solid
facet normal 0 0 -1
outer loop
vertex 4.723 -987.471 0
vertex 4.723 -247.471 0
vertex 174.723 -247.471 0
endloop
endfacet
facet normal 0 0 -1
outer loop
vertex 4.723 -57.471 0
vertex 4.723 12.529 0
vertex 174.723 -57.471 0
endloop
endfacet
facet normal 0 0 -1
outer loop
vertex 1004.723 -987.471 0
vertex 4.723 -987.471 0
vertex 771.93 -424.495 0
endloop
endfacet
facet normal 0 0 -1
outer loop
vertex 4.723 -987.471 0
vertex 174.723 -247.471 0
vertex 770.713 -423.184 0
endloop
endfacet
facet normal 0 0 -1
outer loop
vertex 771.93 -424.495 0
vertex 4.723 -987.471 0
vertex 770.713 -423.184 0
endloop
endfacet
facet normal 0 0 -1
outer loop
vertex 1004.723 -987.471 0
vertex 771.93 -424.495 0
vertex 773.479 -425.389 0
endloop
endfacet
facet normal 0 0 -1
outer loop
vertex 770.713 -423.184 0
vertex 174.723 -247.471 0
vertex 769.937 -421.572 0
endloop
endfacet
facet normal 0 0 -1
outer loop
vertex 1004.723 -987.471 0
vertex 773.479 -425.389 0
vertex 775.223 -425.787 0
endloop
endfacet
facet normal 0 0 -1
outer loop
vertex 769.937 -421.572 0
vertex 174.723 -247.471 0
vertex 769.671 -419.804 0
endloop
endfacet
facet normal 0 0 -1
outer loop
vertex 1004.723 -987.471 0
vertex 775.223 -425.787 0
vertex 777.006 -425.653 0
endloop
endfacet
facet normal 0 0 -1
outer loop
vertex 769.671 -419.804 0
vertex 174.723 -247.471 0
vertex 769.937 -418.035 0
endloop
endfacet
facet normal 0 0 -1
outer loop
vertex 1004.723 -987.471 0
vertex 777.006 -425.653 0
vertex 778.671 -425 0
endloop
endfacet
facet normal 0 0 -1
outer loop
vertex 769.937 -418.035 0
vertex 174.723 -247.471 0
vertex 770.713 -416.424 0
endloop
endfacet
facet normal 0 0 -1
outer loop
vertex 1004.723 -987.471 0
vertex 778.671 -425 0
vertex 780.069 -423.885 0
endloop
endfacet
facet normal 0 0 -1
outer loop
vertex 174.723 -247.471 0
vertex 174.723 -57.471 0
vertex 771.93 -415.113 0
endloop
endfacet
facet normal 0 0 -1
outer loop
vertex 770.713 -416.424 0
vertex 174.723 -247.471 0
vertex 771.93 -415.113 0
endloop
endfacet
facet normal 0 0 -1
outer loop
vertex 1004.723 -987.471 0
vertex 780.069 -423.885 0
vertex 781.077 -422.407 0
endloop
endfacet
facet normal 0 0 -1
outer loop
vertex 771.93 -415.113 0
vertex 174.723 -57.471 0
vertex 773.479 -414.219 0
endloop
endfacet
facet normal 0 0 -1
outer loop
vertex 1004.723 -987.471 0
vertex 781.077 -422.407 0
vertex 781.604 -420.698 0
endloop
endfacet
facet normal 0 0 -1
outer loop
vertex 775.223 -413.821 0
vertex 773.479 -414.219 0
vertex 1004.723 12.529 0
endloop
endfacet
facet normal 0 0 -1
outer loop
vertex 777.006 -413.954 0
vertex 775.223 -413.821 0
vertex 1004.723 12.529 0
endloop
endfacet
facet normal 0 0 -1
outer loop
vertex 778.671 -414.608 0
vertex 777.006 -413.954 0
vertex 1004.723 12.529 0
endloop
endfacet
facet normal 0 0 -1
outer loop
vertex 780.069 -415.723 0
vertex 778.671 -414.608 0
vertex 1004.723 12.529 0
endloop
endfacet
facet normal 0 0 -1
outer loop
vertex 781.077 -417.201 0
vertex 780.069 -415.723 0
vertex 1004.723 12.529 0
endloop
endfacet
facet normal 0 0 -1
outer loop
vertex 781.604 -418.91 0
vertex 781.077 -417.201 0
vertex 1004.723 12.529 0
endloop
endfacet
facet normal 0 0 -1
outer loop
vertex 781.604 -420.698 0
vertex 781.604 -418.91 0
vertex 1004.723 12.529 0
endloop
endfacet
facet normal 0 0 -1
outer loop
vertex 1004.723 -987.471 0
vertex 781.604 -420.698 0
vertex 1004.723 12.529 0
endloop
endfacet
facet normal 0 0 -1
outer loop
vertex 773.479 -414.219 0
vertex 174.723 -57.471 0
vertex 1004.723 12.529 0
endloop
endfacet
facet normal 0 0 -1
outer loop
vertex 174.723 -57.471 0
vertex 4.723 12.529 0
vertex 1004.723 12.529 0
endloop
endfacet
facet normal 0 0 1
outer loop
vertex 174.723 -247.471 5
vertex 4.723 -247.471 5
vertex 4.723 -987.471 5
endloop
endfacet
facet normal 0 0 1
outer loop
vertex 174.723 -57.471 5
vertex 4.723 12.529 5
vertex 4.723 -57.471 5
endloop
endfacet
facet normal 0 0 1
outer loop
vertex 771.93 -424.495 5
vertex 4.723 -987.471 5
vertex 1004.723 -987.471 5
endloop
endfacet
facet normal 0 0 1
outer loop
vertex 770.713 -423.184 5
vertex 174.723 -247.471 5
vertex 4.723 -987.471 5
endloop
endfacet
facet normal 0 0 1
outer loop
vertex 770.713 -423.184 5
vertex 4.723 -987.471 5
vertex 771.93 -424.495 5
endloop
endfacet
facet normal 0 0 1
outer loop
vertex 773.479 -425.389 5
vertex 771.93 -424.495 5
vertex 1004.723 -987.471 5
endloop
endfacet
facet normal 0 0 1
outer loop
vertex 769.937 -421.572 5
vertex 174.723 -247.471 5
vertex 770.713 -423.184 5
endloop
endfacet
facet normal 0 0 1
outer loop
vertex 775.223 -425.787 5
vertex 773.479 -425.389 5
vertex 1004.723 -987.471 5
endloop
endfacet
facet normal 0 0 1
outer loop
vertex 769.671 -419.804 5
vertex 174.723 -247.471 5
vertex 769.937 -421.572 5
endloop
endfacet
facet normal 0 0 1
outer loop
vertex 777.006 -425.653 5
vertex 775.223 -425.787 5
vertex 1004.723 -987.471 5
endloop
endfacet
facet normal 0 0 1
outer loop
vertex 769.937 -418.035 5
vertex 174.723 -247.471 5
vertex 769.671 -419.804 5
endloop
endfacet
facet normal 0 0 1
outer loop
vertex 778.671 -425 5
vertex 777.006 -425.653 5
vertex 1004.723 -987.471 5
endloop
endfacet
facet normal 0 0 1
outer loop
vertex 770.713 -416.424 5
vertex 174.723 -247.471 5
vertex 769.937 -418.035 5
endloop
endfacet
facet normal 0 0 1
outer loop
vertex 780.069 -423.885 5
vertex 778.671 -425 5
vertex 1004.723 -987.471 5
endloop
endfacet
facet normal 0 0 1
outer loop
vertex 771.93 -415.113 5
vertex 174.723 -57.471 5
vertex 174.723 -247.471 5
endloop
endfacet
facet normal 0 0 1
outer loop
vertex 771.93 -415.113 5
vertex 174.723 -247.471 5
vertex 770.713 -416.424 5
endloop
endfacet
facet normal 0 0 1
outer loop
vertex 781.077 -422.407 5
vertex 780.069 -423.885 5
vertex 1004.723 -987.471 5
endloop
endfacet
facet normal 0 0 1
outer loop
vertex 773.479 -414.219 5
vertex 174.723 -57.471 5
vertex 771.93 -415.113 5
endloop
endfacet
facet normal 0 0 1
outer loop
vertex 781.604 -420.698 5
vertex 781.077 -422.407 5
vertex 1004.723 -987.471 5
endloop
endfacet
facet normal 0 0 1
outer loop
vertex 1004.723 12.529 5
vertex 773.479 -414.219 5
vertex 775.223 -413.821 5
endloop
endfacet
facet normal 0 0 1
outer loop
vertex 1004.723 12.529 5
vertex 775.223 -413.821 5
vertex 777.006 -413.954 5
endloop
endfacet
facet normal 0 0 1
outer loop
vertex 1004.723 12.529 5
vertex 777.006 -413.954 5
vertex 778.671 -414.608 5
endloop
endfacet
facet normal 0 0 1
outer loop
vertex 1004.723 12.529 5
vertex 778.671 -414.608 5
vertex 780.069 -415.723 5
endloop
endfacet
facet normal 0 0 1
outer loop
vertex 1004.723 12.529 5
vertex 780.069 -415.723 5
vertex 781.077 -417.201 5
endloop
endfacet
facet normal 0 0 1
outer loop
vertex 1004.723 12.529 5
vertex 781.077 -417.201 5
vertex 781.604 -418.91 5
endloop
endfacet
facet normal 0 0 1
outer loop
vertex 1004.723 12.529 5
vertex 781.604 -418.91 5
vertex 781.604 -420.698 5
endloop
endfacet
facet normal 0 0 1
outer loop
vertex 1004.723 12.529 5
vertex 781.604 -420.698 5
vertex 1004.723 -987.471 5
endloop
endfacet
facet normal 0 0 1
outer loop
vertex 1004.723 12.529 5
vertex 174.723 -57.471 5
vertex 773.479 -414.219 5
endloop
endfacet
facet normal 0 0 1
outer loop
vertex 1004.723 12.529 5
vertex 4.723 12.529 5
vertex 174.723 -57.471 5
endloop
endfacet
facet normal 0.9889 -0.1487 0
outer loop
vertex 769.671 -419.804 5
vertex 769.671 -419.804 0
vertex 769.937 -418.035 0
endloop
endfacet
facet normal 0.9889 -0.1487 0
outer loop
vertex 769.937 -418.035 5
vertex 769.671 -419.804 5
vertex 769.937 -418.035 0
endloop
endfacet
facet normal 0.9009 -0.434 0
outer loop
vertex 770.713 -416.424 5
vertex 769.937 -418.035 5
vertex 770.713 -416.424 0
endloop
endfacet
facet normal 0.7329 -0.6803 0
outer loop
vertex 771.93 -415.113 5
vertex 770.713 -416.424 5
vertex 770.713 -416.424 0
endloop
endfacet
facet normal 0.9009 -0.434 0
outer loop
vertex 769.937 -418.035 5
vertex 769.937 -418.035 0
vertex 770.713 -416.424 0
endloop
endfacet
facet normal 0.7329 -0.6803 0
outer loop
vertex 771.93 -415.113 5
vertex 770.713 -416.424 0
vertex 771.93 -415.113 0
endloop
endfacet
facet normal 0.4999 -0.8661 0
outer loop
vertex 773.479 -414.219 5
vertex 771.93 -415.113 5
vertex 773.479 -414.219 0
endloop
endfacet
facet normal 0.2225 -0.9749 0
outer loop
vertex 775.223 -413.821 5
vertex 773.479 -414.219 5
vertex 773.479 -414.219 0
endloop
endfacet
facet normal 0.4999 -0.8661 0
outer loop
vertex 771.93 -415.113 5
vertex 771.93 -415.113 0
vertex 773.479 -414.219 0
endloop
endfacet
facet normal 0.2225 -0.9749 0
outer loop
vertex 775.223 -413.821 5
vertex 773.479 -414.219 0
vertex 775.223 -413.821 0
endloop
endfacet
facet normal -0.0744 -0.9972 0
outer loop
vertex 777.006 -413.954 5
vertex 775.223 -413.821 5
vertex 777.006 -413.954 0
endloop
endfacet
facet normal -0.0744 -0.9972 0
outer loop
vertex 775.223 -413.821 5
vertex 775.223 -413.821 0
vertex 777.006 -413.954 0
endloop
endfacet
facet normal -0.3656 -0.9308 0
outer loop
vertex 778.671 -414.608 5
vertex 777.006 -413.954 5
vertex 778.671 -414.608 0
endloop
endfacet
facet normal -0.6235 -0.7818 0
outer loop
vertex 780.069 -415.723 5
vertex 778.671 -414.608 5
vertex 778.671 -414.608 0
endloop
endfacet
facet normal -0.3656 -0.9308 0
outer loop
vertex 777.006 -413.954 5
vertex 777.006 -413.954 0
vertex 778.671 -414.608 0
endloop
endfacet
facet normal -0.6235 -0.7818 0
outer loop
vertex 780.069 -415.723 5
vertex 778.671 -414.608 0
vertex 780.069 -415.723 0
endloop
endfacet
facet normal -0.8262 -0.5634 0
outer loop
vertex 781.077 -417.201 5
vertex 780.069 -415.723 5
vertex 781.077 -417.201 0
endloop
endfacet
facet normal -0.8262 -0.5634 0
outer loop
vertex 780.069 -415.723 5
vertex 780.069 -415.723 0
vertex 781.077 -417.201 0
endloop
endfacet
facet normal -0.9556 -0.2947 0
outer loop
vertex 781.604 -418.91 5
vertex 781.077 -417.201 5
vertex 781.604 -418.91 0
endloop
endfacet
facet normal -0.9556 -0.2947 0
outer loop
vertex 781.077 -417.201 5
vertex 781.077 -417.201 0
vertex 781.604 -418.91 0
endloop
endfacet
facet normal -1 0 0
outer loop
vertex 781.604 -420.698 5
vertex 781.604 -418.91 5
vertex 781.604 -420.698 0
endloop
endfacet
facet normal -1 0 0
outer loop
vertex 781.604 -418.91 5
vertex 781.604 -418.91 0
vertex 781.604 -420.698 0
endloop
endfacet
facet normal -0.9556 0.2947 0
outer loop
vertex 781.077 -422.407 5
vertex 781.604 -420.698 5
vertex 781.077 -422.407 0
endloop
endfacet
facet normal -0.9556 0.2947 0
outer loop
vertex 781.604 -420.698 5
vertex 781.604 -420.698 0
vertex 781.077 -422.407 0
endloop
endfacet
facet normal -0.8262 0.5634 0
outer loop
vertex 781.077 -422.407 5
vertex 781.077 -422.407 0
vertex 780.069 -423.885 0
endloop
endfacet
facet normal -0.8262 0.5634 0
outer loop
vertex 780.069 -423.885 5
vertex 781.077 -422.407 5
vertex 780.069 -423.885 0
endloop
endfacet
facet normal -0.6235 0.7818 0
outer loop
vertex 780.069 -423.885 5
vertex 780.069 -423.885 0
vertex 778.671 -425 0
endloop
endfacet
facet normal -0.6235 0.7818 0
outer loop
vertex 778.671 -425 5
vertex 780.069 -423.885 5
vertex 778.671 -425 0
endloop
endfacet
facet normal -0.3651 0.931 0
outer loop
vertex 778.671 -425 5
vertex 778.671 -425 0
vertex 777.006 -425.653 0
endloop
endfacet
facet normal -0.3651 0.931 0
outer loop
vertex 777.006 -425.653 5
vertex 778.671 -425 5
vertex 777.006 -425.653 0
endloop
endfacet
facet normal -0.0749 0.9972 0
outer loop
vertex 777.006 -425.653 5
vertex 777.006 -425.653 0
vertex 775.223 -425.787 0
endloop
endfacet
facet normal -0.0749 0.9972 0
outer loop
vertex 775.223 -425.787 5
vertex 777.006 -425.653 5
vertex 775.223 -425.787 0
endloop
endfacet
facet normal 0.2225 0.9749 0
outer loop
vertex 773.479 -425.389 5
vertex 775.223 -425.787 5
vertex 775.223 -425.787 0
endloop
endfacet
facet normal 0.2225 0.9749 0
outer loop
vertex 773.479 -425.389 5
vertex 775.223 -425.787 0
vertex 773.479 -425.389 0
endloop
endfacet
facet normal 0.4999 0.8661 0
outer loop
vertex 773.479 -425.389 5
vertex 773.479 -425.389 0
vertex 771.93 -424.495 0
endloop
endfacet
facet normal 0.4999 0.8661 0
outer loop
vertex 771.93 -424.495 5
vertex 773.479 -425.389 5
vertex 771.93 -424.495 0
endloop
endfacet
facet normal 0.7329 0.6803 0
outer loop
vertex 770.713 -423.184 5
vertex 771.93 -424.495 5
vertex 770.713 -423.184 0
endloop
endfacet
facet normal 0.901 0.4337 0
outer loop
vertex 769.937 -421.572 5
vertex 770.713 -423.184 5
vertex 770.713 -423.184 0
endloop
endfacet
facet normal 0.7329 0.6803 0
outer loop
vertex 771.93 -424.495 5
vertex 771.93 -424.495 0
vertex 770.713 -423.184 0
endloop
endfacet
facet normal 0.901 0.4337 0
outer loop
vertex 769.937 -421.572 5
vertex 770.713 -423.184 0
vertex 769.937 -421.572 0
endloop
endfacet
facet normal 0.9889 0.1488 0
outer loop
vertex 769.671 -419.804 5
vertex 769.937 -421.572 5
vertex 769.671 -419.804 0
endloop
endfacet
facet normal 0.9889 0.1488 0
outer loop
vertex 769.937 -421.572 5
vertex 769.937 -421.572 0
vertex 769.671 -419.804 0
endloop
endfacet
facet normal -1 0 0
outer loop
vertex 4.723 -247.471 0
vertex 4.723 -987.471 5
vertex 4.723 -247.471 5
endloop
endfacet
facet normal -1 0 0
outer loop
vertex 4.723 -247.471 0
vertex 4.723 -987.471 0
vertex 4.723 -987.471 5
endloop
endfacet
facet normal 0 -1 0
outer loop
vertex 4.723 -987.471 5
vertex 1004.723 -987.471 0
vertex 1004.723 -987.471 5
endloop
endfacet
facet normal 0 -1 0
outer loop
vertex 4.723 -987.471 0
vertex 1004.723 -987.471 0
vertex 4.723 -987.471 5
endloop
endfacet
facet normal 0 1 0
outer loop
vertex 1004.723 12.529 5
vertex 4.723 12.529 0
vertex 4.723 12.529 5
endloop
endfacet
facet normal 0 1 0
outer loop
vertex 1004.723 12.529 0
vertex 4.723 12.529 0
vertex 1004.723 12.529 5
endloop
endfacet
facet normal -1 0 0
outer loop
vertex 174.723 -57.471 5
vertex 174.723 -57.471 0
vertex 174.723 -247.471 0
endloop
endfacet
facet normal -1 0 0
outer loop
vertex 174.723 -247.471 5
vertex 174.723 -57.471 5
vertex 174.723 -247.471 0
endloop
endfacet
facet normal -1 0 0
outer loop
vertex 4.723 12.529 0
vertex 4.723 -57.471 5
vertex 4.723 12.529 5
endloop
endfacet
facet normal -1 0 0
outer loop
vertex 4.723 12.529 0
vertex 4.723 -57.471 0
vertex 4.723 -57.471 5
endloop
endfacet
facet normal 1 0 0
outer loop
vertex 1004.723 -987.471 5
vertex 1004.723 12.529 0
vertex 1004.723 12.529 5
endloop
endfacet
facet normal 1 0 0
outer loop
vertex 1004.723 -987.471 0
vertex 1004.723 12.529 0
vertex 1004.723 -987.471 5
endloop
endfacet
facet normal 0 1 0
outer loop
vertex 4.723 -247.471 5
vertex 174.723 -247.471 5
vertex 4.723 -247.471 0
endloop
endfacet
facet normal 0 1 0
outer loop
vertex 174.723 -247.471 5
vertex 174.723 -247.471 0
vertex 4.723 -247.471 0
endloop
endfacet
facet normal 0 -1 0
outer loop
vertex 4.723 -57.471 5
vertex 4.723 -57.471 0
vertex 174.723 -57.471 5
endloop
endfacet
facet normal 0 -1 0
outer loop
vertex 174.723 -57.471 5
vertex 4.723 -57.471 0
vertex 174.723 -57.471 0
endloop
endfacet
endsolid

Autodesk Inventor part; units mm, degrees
ref_plane "YZ Plane" through (0, 0, 0) normal (1, 0, 0) x (0, 1, 0)
ref_plane "XZ Plane" through (0, 0, 0) normal (0, 1, 0) x (-1, 0, 0)
ref_plane "XY Plane" through (0, 0, 0) normal (0, 0, 1) x (1, 0, 0)
sketch "Sketch1" plane through (0, 0, 0) normal (0, 0, 1) x (1, 0, 0)
  line L0 (4.7232, 12.5287) -> (1004.7232, 12.5287)
  line L1 (1004.7232, 12.5287) -> (1004.7232, -987.4713)
  line L2 (1004.7232, -987.4713) -> (4.7232, -987.4713)
  line L3 (4.7232, -987.4713) -> (4.7232, 12.5287)
  point P0 (0, 0)
  dimension "d0" = 1000
  dimension "d1" = 1000
extrude "Extrusion1" add sketch "Sketch1" along normal blind 5
sketch "Sketch2" plane through (0, 0, 0) normal (0, 0, -1) x (-1, 0, 0)
  circle A0 centre (-775.6709, -419.8039) radius 6
  point P0 (0, 0)
  dimension "d4" = 12
extrude "Extrusion2" cut sketch "Sketch2" against normal blind 5
sketch "Sketch3" plane through (0, 0, 0) normal (0, 0, -1) x (-1, 0, 0)
  line L0 (-4.7232, 12.5287) -> (-4.7232, -987.4713) projected
  line L1 (-4.7232, -57.4713) -> (-174.7232, -57.4713)
  line L2 (-174.7232, -57.4713) -> (-174.7232, -247.4713)
  line L3 (-174.7232, -247.4713) -> (-4.7232, -247.4713)
  line L4 (-4.7232, -247.4713) -> (-4.7232, -57.4713)
  line L5 (-1004.7232, 12.5287) -> (-4.7232, 12.5287) projected
  point P0 (0, 0)
  dimension "d8" = 170
  dimension "d9" = 190
  dimension "d10" = 170
  dimension "d11" = 70
extrude "Extrusion3" cut sketch "Sketch3" against normal through all
properties part number "baseb"
